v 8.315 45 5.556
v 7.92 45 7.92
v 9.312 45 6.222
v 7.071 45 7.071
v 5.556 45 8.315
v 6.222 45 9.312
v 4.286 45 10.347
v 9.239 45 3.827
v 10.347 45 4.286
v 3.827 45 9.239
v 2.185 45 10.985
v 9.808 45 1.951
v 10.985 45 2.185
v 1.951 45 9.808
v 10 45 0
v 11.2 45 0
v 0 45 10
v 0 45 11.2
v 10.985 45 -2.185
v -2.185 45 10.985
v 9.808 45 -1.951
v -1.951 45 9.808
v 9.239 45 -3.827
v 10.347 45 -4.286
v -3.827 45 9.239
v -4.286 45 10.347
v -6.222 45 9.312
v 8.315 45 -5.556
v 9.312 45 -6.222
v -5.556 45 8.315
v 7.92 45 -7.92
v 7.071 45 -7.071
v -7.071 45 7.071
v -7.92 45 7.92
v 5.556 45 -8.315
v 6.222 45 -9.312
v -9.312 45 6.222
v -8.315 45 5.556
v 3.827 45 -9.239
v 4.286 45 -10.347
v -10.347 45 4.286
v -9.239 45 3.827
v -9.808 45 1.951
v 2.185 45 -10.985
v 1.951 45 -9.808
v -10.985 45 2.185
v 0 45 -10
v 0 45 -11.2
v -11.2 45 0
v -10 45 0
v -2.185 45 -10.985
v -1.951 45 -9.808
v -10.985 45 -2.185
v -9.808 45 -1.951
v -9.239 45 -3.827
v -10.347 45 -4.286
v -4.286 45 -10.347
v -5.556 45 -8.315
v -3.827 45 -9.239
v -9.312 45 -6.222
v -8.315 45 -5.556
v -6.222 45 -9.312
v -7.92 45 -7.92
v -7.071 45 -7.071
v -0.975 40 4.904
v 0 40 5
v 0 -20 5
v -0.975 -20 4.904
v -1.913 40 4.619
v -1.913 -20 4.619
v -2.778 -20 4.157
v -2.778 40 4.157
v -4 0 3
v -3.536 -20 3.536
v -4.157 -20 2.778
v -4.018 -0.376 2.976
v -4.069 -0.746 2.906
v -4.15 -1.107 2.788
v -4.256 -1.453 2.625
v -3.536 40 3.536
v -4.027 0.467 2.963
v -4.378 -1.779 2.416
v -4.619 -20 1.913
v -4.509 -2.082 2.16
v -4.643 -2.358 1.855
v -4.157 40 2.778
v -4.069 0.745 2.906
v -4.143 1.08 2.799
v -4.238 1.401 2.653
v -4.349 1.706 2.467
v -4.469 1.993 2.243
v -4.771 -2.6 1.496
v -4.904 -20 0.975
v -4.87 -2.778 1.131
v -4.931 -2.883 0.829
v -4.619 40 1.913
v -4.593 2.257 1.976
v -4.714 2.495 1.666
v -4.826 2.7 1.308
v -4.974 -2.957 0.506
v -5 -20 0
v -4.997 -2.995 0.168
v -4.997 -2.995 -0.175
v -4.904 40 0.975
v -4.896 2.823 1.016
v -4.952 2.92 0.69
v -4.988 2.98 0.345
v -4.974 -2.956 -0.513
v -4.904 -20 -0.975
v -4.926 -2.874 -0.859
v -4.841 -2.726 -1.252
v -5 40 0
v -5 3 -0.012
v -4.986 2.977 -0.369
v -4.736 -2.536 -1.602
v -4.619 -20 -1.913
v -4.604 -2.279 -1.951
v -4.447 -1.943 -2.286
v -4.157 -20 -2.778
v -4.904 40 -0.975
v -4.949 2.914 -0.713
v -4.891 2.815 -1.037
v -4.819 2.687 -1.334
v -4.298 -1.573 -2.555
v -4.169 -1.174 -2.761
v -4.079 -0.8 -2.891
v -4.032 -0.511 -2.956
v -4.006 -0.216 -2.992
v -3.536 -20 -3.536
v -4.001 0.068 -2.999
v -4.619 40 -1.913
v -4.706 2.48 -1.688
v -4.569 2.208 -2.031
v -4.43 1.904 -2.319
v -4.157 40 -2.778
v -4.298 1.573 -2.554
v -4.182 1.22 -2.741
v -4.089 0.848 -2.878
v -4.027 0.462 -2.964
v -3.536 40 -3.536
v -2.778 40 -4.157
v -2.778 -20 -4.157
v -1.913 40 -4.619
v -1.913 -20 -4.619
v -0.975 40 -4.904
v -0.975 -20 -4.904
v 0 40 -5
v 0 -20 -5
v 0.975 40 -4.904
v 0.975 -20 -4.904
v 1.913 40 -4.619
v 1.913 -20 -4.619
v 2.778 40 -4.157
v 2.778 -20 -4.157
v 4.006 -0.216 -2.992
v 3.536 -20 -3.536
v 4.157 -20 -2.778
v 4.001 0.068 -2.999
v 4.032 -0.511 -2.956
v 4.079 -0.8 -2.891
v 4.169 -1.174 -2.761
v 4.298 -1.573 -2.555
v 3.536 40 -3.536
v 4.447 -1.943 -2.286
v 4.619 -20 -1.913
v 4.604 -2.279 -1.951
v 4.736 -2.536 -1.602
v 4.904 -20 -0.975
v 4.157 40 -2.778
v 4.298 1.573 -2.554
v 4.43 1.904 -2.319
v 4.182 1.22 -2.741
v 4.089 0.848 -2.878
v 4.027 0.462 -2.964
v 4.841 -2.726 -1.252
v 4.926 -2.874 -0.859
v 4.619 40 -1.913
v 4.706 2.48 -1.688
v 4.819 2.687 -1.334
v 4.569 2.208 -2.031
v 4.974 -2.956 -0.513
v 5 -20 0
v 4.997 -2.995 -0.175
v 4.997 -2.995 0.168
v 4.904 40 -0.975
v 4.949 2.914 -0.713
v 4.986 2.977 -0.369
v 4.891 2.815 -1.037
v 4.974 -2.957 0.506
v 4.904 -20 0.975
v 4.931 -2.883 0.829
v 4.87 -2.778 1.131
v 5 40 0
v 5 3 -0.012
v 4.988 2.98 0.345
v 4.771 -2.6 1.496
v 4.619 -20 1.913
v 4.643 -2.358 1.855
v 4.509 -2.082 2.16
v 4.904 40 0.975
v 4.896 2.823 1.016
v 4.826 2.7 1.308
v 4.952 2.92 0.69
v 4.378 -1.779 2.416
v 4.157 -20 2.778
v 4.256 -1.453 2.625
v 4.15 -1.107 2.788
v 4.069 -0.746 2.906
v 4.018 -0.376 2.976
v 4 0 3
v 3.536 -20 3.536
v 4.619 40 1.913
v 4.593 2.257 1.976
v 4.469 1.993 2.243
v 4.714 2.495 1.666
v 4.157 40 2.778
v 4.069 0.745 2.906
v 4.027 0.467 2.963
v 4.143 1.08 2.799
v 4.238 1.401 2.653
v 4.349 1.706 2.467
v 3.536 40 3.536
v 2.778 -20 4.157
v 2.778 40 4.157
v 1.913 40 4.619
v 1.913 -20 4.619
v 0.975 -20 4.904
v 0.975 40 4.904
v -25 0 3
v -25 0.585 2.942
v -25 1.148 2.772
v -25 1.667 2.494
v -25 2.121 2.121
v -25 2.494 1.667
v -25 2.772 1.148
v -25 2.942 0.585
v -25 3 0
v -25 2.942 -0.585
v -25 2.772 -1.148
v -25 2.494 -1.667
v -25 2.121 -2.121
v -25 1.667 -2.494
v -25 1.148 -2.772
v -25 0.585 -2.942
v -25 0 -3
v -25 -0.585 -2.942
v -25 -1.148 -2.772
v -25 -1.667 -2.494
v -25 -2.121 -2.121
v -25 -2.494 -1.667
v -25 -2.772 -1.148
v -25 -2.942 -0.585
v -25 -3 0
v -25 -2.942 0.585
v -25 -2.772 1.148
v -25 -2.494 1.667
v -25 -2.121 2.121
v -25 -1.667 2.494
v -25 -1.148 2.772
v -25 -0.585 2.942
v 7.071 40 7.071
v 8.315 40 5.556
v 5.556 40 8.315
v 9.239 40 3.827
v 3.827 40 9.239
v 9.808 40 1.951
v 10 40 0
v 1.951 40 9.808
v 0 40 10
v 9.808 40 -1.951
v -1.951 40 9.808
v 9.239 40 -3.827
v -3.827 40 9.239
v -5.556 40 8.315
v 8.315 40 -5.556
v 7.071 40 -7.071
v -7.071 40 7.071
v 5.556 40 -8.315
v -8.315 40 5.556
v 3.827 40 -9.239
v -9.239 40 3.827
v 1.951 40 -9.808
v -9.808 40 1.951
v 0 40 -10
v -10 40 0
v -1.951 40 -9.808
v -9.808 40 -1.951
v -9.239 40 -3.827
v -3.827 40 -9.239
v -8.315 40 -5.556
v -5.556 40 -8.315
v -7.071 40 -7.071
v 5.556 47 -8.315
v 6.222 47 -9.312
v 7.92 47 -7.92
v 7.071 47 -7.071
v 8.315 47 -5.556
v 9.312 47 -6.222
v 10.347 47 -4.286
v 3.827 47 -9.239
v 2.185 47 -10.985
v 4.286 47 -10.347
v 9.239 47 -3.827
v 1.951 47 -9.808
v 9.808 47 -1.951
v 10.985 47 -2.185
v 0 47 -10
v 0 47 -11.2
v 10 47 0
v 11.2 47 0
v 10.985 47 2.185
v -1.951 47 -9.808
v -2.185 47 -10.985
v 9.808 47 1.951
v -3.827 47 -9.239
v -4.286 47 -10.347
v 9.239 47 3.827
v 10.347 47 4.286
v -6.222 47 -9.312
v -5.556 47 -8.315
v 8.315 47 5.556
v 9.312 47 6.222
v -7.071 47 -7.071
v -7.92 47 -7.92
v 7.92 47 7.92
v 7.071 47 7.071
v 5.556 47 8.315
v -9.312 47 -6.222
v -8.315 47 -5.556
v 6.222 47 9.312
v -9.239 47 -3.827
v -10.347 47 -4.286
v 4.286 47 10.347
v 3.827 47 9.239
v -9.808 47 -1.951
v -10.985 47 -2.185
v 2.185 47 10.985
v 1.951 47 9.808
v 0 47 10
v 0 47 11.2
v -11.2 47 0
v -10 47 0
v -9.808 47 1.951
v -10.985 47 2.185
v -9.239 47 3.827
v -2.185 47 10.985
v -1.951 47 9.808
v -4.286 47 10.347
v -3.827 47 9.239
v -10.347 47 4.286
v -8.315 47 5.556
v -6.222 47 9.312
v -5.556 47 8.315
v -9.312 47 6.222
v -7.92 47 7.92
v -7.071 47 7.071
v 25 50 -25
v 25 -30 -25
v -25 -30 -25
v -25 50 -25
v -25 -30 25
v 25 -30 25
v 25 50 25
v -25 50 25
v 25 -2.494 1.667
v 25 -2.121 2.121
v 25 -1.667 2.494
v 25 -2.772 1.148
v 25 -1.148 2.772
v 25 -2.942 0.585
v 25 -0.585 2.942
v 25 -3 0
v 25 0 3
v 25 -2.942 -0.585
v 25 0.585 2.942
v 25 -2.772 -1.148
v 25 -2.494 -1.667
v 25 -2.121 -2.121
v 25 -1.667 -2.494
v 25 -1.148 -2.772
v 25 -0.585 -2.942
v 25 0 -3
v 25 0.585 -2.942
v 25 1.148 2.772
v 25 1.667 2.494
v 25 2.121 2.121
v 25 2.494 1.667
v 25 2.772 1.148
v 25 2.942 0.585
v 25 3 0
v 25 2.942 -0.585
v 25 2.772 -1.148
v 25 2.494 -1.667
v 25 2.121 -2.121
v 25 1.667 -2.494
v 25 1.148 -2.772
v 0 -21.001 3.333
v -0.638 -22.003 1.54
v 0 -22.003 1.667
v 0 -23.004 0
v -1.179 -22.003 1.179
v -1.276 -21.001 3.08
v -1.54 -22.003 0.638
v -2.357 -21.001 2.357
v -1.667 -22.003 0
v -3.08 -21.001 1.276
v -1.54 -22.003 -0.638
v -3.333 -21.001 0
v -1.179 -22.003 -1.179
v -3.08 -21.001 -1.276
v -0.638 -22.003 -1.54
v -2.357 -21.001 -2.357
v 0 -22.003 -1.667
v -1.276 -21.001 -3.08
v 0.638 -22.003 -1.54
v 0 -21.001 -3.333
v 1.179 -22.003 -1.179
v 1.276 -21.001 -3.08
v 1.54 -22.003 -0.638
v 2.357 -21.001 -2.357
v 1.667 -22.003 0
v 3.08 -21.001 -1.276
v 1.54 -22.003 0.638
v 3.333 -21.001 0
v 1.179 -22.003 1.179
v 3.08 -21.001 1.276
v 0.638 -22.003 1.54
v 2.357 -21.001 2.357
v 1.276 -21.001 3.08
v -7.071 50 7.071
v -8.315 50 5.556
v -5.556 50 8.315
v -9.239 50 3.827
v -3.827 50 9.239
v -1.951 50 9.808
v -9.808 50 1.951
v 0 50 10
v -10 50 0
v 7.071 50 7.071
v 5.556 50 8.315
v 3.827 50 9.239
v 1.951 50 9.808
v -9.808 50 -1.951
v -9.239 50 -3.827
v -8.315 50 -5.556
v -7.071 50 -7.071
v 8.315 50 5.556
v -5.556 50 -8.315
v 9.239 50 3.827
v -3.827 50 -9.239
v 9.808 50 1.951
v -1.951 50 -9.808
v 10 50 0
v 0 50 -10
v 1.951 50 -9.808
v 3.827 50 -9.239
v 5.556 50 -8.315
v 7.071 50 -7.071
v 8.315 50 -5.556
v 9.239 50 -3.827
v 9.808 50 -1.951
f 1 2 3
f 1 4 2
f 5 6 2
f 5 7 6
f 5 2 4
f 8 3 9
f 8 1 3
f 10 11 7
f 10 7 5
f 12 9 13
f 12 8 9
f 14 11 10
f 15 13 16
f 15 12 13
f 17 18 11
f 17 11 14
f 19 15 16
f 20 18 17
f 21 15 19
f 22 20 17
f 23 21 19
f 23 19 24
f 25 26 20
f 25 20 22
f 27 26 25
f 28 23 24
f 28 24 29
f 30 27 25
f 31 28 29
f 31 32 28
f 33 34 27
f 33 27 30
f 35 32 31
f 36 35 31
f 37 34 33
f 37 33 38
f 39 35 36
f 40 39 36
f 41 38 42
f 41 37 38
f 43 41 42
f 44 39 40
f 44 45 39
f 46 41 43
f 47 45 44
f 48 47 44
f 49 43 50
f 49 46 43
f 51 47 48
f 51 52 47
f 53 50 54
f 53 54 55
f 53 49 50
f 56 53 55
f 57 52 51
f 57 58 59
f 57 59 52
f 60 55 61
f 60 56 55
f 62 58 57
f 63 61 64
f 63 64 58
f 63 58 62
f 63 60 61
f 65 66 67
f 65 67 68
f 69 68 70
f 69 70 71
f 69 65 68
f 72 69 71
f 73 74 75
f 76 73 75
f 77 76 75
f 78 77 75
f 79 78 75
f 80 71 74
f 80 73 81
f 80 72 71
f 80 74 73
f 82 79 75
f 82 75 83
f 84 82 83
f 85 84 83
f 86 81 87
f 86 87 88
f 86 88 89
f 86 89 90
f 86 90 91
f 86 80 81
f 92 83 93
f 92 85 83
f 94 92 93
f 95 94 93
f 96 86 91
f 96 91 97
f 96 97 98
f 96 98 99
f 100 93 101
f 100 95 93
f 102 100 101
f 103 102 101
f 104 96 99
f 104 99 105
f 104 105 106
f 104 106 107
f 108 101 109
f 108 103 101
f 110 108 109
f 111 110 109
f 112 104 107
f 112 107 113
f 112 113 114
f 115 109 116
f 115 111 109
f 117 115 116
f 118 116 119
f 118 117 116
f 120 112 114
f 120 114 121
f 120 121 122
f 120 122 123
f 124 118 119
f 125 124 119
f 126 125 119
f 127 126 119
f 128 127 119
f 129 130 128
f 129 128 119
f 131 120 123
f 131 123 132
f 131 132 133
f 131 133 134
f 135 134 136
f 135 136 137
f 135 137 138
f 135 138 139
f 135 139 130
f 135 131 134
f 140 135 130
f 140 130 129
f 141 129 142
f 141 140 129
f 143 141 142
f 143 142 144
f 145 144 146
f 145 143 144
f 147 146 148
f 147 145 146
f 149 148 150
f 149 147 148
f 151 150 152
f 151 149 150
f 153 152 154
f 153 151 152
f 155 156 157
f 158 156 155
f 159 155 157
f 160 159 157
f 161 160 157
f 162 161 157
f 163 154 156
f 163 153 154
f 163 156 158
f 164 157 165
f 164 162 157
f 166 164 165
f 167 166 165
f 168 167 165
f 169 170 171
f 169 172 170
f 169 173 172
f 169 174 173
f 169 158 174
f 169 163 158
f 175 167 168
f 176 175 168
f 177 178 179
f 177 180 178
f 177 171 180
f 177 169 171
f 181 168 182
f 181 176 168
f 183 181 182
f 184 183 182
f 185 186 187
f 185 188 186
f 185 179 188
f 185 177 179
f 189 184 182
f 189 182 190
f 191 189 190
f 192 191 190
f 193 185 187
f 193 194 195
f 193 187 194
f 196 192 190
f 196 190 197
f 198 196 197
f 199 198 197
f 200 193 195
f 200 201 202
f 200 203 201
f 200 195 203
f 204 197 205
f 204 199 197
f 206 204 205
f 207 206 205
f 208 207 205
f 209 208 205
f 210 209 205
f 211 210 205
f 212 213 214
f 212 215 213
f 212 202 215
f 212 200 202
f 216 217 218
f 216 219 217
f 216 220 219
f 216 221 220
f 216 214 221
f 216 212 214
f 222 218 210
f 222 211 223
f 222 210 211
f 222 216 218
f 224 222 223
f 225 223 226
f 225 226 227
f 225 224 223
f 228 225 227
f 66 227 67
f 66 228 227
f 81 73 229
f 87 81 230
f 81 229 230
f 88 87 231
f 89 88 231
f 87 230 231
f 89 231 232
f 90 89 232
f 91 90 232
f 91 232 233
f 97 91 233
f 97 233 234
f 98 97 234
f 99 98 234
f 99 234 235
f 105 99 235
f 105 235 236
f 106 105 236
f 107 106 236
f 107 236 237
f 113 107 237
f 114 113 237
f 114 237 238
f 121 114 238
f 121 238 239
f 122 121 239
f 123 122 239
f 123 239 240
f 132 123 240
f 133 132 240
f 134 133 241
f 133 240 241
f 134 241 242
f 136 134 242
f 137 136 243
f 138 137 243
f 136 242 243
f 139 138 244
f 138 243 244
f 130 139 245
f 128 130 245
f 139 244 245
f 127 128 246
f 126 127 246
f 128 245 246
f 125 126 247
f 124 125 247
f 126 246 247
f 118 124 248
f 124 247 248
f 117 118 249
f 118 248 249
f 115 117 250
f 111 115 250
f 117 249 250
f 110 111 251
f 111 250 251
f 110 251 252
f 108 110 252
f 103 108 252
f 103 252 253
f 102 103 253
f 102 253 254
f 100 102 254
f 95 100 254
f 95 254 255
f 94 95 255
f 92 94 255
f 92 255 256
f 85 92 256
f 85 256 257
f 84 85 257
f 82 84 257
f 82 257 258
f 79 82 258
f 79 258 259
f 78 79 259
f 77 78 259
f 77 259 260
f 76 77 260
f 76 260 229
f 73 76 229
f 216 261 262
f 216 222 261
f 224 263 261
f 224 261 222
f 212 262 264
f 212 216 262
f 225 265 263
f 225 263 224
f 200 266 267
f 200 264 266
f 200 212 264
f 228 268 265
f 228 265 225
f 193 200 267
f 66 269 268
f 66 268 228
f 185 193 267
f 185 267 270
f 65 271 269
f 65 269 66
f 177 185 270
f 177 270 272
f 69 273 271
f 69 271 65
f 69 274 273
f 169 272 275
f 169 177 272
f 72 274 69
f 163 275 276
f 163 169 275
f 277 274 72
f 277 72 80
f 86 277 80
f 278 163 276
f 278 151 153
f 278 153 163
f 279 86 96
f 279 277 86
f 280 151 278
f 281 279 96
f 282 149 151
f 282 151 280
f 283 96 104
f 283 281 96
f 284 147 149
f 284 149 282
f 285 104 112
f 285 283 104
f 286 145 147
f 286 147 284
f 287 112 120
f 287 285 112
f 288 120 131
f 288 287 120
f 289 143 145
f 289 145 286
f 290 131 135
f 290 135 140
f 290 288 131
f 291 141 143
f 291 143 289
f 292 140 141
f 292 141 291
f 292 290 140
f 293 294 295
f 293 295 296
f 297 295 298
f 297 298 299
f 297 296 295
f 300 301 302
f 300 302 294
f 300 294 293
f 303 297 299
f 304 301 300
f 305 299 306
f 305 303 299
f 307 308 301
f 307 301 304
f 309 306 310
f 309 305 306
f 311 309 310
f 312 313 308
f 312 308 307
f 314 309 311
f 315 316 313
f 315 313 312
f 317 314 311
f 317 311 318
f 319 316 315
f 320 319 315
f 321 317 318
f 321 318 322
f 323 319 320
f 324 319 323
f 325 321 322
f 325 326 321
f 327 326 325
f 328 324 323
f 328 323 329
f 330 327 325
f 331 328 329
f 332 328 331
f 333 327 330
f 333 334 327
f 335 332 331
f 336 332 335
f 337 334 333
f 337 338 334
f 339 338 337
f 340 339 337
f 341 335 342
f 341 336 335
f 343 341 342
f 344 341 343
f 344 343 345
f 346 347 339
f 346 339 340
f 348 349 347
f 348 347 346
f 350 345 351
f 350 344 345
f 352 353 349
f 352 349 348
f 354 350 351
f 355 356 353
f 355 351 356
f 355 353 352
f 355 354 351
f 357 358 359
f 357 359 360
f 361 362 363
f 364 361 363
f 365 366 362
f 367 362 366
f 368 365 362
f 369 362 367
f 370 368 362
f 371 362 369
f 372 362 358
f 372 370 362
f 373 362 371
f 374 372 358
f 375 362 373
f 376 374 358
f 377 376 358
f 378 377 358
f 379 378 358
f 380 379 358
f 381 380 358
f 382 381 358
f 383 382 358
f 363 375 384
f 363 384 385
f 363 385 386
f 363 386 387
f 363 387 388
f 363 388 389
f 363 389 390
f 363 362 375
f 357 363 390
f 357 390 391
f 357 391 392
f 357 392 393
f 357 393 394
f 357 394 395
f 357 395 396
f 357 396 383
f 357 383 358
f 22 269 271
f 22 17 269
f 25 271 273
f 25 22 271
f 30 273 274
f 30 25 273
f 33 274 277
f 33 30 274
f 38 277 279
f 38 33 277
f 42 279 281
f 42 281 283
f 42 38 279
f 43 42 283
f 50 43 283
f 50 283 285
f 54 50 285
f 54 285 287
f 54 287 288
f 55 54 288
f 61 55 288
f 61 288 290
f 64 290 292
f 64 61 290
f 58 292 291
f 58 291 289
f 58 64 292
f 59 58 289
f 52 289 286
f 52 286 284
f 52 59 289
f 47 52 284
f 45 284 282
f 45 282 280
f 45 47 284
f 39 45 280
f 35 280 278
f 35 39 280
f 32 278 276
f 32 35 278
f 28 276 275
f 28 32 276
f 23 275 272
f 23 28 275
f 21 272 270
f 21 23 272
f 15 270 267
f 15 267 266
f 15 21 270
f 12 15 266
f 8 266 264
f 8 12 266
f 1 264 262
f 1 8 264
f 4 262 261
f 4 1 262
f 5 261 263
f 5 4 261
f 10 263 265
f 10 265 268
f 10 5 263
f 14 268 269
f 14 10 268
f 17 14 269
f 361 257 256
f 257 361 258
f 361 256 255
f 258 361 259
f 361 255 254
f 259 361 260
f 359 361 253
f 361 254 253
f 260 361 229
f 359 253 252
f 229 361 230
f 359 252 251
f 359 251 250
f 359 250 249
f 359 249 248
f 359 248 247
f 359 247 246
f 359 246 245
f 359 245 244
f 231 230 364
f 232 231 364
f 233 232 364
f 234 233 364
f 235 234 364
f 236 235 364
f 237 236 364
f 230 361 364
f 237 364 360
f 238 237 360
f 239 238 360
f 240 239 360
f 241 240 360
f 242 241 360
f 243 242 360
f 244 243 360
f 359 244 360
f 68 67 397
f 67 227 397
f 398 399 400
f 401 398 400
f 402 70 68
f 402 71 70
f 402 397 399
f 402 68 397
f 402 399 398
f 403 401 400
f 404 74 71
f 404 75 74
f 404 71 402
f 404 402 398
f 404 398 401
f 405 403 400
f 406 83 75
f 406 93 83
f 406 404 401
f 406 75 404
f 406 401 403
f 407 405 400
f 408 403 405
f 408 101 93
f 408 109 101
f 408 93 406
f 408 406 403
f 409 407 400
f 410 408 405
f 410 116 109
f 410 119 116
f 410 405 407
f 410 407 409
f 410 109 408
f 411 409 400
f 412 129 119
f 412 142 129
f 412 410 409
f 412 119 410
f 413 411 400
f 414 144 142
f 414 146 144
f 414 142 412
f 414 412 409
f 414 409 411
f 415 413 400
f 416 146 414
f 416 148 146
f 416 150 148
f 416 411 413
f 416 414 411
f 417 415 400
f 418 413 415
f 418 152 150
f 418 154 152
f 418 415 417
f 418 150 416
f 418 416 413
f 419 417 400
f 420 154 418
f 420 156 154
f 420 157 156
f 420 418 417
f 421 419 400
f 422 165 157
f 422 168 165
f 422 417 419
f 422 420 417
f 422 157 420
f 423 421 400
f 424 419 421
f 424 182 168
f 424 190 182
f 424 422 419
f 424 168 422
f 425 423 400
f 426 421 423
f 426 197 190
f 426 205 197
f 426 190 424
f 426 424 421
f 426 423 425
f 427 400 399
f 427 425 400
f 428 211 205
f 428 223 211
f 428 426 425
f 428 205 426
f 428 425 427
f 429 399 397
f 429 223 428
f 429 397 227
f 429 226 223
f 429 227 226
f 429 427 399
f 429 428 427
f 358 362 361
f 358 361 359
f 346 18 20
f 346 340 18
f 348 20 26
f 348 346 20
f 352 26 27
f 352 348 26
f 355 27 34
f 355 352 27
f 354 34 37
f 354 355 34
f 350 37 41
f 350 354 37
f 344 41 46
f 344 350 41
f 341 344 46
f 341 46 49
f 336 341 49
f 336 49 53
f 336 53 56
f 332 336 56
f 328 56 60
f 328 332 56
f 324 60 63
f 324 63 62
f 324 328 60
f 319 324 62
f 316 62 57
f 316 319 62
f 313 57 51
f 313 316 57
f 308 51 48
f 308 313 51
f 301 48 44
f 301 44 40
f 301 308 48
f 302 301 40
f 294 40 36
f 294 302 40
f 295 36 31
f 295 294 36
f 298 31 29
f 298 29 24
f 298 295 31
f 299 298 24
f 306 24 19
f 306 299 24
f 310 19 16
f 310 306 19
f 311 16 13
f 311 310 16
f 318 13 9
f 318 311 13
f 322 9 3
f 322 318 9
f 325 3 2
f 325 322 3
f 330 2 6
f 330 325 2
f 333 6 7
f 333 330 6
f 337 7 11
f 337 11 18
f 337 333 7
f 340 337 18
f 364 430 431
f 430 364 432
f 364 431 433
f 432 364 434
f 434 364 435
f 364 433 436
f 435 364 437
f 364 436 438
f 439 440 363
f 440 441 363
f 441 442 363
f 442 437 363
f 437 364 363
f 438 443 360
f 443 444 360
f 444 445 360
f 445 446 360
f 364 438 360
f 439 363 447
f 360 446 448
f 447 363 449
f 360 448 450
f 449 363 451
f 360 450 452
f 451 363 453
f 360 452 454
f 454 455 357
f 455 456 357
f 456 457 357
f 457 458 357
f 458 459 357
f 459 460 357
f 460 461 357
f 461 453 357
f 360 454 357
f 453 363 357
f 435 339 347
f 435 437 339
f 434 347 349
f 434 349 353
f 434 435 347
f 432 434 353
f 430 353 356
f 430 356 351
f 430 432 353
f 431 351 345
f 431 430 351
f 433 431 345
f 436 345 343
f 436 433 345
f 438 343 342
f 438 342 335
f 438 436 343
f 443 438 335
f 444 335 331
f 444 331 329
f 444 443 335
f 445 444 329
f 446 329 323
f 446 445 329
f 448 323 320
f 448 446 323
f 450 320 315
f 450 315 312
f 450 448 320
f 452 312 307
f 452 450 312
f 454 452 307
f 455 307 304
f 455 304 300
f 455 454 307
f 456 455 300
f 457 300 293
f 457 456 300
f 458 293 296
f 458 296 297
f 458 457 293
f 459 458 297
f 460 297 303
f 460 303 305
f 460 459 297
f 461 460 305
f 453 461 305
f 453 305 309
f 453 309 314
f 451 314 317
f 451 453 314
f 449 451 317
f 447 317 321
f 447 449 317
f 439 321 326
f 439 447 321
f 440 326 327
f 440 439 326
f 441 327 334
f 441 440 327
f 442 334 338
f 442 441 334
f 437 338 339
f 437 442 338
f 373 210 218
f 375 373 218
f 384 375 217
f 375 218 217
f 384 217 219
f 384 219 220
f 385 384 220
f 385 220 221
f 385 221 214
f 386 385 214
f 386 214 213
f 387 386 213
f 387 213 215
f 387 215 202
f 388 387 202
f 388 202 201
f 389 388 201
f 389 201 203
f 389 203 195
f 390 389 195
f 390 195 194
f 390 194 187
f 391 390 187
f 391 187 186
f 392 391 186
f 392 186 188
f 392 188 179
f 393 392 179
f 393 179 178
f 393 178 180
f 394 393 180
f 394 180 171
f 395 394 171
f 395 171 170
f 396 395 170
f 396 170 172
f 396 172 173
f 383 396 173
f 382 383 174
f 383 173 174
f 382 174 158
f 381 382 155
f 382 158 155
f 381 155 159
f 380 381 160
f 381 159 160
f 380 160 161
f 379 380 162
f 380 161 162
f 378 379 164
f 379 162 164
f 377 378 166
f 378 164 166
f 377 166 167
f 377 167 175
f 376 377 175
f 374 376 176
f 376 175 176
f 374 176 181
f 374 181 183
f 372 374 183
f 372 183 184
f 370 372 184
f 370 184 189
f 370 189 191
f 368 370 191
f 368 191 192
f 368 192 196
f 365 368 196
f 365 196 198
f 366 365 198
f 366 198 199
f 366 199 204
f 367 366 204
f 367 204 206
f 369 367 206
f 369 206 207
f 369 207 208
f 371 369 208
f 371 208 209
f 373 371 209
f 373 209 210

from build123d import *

# Parameters (mm, degrees)
SKIZZE1_W                       = 50
SKIZZE1_H                       = 80
AUFSATZ_LINEAR_AUSTRAGEN1_DEPTH = 25
F_6_0_6_DURCHMESSER_BOHRUNG1_D  = 6


with BuildPart() as part:
    # Skizze1 → Aufsatz-Linear austragen1 (new body, symmetric)
    with BuildSketch(Plane(origin=(0, 0, 0), x_dir=(0, 0, -1), z_dir=(1, 0, 0))):
        with Locations((0, 10)):
            Rectangle(SKIZZE1_W, SKIZZE1_H)
    extrude(amount=AUFSATZ_LINEAR_AUSTRAGEN1_DEPTH, both=True)

    # Skizze2 → Schnitt-Rotation1 (revolve, cut)
    with BuildSketch(Plane(origin=(0, 0, 0), x_dir=(0, 0, -1), z_dir=(1, 0, 0)), mode=Mode.PRIVATE) as schnitt_rotation1_sk:
        Polygon((0, 50), (0, -23.004303095), (5, -20), (5, 40), (10, 40), (10, 45), (11.2, 45), (11.2, 47), (10, 47), (10, 50), align=None)
    revolve(schnitt_rotation1_sk.sketch.rotate(Axis((0, -23.004303095, 0), (0, -1, 0)), 180), axis=Axis((0, -23.004303095, 0), (0, -1, 0)), mode=Mode.SUBTRACT)  # turned: the seam where the file's is

    # Ø6.0 (6) Durchmesser Bohrung1 (through all)
    with Locations(Plane(origin=(25, 0, 0), x_dir=(0, 0, -1), z_dir=(1, 0, 0))):
        with Locations((0, 0)):
            Hole(F_6_0_6_DURCHMESSER_BOHRUNG1_D / 2)


solid = part.part
